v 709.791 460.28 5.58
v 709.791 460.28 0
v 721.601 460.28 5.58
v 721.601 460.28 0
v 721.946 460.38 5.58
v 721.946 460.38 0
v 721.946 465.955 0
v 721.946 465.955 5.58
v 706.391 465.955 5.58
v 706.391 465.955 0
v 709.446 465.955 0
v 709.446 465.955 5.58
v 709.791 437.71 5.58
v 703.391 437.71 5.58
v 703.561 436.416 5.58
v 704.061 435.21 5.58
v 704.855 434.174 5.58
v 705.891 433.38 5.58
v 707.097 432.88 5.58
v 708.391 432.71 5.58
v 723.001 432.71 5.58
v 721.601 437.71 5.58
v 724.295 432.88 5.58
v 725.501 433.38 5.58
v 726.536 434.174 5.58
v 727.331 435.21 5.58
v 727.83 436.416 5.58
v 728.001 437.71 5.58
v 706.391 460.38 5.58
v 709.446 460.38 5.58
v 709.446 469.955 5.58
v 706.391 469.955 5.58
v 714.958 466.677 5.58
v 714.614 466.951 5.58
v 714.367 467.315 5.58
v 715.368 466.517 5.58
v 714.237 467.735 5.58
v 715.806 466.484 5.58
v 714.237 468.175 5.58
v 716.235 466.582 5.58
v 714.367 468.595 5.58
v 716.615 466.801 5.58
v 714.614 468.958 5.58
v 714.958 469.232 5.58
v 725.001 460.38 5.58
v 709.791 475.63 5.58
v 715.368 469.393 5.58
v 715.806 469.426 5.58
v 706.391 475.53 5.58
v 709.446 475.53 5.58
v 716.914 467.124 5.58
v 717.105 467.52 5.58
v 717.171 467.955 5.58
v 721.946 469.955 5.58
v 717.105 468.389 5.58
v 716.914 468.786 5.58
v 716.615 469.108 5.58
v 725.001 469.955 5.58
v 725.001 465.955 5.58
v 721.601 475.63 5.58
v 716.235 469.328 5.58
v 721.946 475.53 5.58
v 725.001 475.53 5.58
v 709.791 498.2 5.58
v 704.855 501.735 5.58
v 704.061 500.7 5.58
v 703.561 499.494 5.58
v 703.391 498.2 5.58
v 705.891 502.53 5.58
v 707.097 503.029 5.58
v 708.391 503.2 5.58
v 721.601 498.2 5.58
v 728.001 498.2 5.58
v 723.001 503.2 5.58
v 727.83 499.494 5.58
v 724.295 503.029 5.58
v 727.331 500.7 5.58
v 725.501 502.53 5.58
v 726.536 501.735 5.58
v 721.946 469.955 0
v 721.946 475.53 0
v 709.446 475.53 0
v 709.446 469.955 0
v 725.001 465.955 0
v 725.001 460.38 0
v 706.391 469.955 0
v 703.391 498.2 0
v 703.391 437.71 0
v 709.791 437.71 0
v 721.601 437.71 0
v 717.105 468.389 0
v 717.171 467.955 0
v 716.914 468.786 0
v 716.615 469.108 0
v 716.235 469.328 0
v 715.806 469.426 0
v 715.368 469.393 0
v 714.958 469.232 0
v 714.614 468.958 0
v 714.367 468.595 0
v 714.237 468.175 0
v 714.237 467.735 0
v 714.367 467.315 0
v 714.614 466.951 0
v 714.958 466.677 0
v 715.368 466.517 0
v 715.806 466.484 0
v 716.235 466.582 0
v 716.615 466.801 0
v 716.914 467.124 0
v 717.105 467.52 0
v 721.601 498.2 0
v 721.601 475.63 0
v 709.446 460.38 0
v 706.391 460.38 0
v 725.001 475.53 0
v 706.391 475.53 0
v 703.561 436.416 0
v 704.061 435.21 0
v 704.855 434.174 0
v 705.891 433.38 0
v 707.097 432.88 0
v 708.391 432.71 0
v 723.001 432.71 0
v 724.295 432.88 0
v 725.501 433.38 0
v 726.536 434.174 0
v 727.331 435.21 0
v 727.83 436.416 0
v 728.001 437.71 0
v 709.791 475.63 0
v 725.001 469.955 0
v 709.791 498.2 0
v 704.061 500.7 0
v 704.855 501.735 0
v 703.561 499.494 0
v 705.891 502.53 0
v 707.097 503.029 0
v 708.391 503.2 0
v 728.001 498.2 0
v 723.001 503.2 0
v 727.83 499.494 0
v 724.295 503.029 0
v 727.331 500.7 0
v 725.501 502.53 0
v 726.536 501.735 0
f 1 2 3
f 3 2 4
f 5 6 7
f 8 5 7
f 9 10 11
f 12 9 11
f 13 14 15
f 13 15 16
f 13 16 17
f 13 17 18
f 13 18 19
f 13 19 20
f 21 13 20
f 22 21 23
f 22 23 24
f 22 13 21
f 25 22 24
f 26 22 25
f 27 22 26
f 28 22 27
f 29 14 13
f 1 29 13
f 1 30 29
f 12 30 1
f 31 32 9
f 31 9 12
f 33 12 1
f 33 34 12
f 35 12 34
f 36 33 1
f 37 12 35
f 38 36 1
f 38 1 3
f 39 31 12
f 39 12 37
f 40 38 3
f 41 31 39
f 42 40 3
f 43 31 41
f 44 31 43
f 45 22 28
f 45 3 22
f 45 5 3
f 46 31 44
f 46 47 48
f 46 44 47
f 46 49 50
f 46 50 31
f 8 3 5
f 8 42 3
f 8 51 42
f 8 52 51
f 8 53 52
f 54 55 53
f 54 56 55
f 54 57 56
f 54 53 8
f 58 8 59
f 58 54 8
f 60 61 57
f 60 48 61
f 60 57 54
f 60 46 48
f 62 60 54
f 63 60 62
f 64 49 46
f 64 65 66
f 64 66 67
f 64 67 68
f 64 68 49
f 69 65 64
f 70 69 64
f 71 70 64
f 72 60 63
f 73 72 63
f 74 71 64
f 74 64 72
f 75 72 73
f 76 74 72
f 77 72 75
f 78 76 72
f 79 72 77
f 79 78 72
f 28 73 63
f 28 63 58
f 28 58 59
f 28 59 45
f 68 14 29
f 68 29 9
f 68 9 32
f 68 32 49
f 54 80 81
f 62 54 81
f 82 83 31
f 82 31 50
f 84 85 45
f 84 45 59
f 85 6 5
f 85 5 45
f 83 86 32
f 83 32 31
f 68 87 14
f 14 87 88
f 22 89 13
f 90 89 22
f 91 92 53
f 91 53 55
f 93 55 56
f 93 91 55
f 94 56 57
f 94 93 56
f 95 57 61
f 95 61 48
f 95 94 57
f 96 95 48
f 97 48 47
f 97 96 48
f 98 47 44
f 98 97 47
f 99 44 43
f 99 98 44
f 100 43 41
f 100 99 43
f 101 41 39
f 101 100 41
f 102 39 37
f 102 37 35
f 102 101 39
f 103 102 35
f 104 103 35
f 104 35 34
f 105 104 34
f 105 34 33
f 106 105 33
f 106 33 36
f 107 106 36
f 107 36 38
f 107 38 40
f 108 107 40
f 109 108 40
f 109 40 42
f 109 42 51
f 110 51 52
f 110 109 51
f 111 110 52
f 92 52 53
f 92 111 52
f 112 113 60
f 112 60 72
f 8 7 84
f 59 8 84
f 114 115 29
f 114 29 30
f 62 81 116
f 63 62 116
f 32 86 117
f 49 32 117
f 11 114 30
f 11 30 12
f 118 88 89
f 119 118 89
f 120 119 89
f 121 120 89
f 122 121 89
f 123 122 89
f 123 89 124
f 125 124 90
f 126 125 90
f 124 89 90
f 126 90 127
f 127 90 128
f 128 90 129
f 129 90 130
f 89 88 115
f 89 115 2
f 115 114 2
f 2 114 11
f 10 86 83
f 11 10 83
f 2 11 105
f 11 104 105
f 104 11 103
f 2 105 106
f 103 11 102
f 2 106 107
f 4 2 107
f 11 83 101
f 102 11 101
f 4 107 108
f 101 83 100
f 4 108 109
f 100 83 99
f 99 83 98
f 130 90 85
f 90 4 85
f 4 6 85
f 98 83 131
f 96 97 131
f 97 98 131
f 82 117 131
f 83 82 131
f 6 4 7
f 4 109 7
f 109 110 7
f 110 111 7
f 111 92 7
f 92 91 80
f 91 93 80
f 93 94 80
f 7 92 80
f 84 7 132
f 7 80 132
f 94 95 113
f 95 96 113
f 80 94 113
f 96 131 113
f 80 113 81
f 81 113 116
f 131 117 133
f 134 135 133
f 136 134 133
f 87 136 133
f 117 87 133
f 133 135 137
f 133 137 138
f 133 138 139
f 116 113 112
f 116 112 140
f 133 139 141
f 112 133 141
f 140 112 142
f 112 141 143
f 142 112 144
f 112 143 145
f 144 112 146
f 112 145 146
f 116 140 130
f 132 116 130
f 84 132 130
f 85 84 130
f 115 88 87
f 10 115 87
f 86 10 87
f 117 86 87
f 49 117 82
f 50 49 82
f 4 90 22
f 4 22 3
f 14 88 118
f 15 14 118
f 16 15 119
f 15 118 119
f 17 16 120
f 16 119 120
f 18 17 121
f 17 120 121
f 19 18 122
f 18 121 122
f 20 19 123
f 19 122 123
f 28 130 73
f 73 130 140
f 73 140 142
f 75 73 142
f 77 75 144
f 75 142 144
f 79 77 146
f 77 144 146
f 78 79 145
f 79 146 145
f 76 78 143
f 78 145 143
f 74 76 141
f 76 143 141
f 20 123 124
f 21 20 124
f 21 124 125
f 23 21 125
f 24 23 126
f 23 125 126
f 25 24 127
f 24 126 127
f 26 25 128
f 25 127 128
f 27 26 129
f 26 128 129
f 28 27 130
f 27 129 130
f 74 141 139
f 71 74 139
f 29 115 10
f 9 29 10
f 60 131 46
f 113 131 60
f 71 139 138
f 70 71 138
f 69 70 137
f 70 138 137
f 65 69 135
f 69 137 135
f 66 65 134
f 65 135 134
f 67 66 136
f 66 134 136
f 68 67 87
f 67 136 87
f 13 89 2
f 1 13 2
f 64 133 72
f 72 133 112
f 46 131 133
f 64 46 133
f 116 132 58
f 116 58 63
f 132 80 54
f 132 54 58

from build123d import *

# Parameters (mm, degrees)
SKETCH1_W           = 3.055
SKETCH1_H           = 5.575
SKETCH1_W_2         = 11.81
SKETCH1_H_2         = 22.57
SKETCH1_R           = 1.475
BOSS_EXTRUDE1_DEPTH = 5.58


with BuildPart() as part:
    # Sketch1 → Boss-Extrude1 (new body)
    with BuildSketch(Plane.XY):
        with BuildLine():
            Line((708.390729089, 432.709671907), (715.695729089, 432.709671907))
            Line((715.695729089, 432.709671907), (723.000729089, 432.709671907))
            ThreePointArc((723.000729089, 432.709671907), (726.536262995, 434.174138001), (728.000729089, 437.709671907))
            Line((728.000729089, 437.709671907), (728.000729089, 498.199671907))
            ThreePointArc((728.000729089, 498.199671907), (726.536262995, 501.735205812), (723.000729089, 503.199671907))
            Line((723.000729089, 503.199671907), (715.695729089, 503.199671907))
            Line((715.695729089, 503.199671907), (708.390729089, 503.199671907))
            ThreePointArc((708.390729089, 503.199671907), (704.855195183, 501.735205812), (703.390729089, 498.199671907))
            Line((703.390729089, 498.199671907), (703.390729089, 437.709671907))
            ThreePointArc((703.390729089, 437.709671907), (704.855195183, 434.174138001), (708.390729089, 432.709671907))
        make_face()
        with Locations((707.918229089, 463.167171907)):
            Rectangle(SKETCH1_W, SKETCH1_H, mode=Mode.SUBTRACT)
        with Locations((715.695729089, 448.994671907)):
            Rectangle(SKETCH1_W_2, SKETCH1_H_2, mode=Mode.SUBTRACT)
        with Locations((715.695729089, 467.954671907)):
            Circle(SKETCH1_R, mode=Mode.SUBTRACT)
        with Locations((723.473229089, 463.167171907)):
            Rectangle(SKETCH1_W, SKETCH1_H, mode=Mode.SUBTRACT)
        with Locations((707.918229089, 472.742171907)):
            Rectangle(SKETCH1_W, SKETCH1_H, mode=Mode.SUBTRACT)
        with Locations((723.473229089, 472.742171907)):
            Rectangle(SKETCH1_W, SKETCH1_H, mode=Mode.SUBTRACT)
        with Locations((715.695729089, 486.914671907)):
            Rectangle(SKETCH1_W_2, SKETCH1_H_2, mode=Mode.SUBTRACT)
    extrude(amount=BOSS_EXTRUDE1_DEPTH)


solid = part.part
